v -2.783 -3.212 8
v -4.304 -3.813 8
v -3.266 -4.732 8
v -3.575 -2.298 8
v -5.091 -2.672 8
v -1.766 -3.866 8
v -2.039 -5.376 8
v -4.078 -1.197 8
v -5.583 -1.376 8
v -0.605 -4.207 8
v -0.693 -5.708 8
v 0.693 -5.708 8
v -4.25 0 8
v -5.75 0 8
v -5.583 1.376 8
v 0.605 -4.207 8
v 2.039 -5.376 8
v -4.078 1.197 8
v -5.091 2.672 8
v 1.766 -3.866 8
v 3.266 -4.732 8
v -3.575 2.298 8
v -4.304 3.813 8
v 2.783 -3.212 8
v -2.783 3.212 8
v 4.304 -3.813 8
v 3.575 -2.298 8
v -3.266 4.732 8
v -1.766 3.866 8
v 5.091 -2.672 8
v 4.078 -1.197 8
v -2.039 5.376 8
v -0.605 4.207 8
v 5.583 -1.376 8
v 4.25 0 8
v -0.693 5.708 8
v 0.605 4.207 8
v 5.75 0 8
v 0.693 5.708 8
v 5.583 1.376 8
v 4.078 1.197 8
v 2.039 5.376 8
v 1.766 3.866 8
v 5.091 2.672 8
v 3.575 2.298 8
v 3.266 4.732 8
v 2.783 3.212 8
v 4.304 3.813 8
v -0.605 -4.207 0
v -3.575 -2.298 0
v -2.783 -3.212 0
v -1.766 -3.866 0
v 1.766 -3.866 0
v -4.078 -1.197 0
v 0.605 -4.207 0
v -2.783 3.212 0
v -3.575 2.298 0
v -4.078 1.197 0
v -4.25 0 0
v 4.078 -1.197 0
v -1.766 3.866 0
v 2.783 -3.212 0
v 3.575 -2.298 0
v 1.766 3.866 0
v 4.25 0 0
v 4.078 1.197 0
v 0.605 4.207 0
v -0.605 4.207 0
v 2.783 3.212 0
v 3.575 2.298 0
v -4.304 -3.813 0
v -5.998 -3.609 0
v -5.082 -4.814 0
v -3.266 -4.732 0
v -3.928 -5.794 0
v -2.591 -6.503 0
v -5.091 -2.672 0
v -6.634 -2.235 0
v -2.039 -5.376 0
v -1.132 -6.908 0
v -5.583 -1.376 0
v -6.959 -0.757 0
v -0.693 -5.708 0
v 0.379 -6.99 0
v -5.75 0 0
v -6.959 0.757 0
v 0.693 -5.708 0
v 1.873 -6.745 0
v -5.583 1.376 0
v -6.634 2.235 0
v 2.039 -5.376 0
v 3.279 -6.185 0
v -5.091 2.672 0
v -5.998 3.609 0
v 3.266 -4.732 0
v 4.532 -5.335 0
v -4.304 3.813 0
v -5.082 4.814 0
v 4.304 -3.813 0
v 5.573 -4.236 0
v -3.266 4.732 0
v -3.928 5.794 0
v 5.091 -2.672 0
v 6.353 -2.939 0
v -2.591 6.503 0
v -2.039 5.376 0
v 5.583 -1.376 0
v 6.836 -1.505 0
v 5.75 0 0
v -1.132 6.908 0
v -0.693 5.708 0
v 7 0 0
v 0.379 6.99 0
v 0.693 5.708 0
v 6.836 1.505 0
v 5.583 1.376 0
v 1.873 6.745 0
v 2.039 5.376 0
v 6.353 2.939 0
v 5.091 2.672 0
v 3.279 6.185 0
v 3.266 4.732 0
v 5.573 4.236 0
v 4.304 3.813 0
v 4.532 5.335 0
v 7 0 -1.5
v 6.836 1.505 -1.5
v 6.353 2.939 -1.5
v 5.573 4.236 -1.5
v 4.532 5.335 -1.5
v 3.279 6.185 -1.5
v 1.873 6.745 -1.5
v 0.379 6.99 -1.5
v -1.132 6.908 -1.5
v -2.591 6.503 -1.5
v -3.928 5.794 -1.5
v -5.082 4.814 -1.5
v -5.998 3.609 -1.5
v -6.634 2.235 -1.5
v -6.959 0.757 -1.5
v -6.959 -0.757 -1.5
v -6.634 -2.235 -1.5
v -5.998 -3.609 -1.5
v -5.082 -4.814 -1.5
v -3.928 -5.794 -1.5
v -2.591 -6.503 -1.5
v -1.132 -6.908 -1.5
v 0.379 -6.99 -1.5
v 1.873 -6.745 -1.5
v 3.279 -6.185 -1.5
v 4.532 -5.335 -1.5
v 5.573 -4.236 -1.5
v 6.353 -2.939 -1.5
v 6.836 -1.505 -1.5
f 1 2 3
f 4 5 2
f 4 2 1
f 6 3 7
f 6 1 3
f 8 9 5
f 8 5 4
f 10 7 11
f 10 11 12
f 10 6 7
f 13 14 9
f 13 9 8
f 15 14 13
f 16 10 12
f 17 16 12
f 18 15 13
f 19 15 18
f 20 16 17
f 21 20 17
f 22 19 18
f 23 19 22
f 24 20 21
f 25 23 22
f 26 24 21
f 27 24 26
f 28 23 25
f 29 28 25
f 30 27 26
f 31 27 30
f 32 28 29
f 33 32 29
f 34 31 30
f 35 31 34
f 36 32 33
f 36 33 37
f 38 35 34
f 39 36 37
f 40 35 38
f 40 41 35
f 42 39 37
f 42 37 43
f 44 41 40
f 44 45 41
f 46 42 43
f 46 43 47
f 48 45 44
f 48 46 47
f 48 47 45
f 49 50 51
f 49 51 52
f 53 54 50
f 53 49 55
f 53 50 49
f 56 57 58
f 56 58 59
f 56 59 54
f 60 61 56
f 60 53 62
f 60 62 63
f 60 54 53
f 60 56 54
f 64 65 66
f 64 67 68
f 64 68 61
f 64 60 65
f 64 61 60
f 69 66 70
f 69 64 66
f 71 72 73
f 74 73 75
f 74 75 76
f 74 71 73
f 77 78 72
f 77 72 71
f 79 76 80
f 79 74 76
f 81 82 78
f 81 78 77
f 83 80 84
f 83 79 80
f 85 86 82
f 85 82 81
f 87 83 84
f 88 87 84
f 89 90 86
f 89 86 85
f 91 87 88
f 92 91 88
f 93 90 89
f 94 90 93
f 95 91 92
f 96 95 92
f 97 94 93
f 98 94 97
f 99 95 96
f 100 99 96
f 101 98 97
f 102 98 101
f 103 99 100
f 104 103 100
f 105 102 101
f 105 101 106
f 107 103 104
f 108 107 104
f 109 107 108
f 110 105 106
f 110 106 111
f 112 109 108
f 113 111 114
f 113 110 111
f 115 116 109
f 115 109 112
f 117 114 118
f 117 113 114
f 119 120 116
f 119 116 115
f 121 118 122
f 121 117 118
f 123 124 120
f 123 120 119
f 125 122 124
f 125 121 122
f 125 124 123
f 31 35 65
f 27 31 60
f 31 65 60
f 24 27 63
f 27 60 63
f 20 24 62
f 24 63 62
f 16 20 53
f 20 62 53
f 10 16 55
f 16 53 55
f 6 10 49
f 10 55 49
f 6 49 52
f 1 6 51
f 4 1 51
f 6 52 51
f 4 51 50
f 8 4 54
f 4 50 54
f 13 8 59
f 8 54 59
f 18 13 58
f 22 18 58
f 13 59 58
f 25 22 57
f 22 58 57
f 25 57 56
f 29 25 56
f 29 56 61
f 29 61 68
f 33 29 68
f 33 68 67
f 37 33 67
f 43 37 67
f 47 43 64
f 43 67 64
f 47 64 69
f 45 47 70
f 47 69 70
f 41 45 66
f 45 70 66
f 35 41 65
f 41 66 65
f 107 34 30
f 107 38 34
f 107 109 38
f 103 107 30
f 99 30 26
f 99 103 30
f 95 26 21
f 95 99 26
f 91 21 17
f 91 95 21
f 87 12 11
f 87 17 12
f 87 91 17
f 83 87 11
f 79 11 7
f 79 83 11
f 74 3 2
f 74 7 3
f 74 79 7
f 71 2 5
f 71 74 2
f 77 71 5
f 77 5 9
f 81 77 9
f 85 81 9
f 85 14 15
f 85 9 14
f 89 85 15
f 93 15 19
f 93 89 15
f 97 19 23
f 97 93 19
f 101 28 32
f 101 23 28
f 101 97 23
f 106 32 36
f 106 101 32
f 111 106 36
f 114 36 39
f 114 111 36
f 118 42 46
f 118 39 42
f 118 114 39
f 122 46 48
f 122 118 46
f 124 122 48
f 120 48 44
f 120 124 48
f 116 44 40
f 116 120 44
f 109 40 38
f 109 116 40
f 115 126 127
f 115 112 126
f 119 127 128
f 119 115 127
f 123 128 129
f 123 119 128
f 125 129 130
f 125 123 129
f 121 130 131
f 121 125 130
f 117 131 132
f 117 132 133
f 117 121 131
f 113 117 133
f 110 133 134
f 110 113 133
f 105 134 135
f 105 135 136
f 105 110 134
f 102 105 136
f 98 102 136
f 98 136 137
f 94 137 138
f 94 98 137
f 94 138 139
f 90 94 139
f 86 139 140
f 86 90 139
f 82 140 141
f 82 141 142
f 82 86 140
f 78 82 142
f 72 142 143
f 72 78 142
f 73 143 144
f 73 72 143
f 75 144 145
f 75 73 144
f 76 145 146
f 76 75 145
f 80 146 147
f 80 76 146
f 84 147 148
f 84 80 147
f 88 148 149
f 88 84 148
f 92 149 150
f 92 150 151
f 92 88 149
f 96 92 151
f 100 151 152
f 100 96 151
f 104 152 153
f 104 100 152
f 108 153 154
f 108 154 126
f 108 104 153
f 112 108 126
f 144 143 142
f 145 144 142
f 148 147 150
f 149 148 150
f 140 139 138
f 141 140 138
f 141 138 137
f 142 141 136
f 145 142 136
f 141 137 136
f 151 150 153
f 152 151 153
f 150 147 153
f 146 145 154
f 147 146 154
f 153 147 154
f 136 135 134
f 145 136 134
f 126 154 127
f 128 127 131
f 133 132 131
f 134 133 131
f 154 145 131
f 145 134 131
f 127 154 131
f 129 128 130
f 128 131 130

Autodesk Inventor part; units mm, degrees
ref_plane "YZ Plane" through (0, 0, 0) normal (1, 0, 0) x (0, 1, 0)
ref_plane "XZ Plane" through (0, 0, 0) normal (0, 1, 0) x (-1, 0, 0)
ref_plane "XY Plane" through (0, 0, 0) normal (0, 0, 1) x (1, 0, 0)
sketch "Sketch1" plane through (0, 0, 0) normal (0, 0, 1) x (1, 0, 0)
  circle A0 centre (0, 0) radius 7
  circle A1 centre (0, 0) radius 5.75
  circle A2 centre (0, 0) radius 4.25
  dimension "d0" = 14
  dimension "d1" = 11.5
  dimension "d6" = 8.5
extrude "Extrusion1" add sketch "Sketch1" along normal blind 8 contours A1 | A2
extrude "Extrusion2" add sketch "Sketch1" against normal blind 1.5 contours A0 | A1 | A2
extrude "Extrusion3" cut sketch "Sketch1" along normal up to next contours A2
properties part number "Rodend12mil"
